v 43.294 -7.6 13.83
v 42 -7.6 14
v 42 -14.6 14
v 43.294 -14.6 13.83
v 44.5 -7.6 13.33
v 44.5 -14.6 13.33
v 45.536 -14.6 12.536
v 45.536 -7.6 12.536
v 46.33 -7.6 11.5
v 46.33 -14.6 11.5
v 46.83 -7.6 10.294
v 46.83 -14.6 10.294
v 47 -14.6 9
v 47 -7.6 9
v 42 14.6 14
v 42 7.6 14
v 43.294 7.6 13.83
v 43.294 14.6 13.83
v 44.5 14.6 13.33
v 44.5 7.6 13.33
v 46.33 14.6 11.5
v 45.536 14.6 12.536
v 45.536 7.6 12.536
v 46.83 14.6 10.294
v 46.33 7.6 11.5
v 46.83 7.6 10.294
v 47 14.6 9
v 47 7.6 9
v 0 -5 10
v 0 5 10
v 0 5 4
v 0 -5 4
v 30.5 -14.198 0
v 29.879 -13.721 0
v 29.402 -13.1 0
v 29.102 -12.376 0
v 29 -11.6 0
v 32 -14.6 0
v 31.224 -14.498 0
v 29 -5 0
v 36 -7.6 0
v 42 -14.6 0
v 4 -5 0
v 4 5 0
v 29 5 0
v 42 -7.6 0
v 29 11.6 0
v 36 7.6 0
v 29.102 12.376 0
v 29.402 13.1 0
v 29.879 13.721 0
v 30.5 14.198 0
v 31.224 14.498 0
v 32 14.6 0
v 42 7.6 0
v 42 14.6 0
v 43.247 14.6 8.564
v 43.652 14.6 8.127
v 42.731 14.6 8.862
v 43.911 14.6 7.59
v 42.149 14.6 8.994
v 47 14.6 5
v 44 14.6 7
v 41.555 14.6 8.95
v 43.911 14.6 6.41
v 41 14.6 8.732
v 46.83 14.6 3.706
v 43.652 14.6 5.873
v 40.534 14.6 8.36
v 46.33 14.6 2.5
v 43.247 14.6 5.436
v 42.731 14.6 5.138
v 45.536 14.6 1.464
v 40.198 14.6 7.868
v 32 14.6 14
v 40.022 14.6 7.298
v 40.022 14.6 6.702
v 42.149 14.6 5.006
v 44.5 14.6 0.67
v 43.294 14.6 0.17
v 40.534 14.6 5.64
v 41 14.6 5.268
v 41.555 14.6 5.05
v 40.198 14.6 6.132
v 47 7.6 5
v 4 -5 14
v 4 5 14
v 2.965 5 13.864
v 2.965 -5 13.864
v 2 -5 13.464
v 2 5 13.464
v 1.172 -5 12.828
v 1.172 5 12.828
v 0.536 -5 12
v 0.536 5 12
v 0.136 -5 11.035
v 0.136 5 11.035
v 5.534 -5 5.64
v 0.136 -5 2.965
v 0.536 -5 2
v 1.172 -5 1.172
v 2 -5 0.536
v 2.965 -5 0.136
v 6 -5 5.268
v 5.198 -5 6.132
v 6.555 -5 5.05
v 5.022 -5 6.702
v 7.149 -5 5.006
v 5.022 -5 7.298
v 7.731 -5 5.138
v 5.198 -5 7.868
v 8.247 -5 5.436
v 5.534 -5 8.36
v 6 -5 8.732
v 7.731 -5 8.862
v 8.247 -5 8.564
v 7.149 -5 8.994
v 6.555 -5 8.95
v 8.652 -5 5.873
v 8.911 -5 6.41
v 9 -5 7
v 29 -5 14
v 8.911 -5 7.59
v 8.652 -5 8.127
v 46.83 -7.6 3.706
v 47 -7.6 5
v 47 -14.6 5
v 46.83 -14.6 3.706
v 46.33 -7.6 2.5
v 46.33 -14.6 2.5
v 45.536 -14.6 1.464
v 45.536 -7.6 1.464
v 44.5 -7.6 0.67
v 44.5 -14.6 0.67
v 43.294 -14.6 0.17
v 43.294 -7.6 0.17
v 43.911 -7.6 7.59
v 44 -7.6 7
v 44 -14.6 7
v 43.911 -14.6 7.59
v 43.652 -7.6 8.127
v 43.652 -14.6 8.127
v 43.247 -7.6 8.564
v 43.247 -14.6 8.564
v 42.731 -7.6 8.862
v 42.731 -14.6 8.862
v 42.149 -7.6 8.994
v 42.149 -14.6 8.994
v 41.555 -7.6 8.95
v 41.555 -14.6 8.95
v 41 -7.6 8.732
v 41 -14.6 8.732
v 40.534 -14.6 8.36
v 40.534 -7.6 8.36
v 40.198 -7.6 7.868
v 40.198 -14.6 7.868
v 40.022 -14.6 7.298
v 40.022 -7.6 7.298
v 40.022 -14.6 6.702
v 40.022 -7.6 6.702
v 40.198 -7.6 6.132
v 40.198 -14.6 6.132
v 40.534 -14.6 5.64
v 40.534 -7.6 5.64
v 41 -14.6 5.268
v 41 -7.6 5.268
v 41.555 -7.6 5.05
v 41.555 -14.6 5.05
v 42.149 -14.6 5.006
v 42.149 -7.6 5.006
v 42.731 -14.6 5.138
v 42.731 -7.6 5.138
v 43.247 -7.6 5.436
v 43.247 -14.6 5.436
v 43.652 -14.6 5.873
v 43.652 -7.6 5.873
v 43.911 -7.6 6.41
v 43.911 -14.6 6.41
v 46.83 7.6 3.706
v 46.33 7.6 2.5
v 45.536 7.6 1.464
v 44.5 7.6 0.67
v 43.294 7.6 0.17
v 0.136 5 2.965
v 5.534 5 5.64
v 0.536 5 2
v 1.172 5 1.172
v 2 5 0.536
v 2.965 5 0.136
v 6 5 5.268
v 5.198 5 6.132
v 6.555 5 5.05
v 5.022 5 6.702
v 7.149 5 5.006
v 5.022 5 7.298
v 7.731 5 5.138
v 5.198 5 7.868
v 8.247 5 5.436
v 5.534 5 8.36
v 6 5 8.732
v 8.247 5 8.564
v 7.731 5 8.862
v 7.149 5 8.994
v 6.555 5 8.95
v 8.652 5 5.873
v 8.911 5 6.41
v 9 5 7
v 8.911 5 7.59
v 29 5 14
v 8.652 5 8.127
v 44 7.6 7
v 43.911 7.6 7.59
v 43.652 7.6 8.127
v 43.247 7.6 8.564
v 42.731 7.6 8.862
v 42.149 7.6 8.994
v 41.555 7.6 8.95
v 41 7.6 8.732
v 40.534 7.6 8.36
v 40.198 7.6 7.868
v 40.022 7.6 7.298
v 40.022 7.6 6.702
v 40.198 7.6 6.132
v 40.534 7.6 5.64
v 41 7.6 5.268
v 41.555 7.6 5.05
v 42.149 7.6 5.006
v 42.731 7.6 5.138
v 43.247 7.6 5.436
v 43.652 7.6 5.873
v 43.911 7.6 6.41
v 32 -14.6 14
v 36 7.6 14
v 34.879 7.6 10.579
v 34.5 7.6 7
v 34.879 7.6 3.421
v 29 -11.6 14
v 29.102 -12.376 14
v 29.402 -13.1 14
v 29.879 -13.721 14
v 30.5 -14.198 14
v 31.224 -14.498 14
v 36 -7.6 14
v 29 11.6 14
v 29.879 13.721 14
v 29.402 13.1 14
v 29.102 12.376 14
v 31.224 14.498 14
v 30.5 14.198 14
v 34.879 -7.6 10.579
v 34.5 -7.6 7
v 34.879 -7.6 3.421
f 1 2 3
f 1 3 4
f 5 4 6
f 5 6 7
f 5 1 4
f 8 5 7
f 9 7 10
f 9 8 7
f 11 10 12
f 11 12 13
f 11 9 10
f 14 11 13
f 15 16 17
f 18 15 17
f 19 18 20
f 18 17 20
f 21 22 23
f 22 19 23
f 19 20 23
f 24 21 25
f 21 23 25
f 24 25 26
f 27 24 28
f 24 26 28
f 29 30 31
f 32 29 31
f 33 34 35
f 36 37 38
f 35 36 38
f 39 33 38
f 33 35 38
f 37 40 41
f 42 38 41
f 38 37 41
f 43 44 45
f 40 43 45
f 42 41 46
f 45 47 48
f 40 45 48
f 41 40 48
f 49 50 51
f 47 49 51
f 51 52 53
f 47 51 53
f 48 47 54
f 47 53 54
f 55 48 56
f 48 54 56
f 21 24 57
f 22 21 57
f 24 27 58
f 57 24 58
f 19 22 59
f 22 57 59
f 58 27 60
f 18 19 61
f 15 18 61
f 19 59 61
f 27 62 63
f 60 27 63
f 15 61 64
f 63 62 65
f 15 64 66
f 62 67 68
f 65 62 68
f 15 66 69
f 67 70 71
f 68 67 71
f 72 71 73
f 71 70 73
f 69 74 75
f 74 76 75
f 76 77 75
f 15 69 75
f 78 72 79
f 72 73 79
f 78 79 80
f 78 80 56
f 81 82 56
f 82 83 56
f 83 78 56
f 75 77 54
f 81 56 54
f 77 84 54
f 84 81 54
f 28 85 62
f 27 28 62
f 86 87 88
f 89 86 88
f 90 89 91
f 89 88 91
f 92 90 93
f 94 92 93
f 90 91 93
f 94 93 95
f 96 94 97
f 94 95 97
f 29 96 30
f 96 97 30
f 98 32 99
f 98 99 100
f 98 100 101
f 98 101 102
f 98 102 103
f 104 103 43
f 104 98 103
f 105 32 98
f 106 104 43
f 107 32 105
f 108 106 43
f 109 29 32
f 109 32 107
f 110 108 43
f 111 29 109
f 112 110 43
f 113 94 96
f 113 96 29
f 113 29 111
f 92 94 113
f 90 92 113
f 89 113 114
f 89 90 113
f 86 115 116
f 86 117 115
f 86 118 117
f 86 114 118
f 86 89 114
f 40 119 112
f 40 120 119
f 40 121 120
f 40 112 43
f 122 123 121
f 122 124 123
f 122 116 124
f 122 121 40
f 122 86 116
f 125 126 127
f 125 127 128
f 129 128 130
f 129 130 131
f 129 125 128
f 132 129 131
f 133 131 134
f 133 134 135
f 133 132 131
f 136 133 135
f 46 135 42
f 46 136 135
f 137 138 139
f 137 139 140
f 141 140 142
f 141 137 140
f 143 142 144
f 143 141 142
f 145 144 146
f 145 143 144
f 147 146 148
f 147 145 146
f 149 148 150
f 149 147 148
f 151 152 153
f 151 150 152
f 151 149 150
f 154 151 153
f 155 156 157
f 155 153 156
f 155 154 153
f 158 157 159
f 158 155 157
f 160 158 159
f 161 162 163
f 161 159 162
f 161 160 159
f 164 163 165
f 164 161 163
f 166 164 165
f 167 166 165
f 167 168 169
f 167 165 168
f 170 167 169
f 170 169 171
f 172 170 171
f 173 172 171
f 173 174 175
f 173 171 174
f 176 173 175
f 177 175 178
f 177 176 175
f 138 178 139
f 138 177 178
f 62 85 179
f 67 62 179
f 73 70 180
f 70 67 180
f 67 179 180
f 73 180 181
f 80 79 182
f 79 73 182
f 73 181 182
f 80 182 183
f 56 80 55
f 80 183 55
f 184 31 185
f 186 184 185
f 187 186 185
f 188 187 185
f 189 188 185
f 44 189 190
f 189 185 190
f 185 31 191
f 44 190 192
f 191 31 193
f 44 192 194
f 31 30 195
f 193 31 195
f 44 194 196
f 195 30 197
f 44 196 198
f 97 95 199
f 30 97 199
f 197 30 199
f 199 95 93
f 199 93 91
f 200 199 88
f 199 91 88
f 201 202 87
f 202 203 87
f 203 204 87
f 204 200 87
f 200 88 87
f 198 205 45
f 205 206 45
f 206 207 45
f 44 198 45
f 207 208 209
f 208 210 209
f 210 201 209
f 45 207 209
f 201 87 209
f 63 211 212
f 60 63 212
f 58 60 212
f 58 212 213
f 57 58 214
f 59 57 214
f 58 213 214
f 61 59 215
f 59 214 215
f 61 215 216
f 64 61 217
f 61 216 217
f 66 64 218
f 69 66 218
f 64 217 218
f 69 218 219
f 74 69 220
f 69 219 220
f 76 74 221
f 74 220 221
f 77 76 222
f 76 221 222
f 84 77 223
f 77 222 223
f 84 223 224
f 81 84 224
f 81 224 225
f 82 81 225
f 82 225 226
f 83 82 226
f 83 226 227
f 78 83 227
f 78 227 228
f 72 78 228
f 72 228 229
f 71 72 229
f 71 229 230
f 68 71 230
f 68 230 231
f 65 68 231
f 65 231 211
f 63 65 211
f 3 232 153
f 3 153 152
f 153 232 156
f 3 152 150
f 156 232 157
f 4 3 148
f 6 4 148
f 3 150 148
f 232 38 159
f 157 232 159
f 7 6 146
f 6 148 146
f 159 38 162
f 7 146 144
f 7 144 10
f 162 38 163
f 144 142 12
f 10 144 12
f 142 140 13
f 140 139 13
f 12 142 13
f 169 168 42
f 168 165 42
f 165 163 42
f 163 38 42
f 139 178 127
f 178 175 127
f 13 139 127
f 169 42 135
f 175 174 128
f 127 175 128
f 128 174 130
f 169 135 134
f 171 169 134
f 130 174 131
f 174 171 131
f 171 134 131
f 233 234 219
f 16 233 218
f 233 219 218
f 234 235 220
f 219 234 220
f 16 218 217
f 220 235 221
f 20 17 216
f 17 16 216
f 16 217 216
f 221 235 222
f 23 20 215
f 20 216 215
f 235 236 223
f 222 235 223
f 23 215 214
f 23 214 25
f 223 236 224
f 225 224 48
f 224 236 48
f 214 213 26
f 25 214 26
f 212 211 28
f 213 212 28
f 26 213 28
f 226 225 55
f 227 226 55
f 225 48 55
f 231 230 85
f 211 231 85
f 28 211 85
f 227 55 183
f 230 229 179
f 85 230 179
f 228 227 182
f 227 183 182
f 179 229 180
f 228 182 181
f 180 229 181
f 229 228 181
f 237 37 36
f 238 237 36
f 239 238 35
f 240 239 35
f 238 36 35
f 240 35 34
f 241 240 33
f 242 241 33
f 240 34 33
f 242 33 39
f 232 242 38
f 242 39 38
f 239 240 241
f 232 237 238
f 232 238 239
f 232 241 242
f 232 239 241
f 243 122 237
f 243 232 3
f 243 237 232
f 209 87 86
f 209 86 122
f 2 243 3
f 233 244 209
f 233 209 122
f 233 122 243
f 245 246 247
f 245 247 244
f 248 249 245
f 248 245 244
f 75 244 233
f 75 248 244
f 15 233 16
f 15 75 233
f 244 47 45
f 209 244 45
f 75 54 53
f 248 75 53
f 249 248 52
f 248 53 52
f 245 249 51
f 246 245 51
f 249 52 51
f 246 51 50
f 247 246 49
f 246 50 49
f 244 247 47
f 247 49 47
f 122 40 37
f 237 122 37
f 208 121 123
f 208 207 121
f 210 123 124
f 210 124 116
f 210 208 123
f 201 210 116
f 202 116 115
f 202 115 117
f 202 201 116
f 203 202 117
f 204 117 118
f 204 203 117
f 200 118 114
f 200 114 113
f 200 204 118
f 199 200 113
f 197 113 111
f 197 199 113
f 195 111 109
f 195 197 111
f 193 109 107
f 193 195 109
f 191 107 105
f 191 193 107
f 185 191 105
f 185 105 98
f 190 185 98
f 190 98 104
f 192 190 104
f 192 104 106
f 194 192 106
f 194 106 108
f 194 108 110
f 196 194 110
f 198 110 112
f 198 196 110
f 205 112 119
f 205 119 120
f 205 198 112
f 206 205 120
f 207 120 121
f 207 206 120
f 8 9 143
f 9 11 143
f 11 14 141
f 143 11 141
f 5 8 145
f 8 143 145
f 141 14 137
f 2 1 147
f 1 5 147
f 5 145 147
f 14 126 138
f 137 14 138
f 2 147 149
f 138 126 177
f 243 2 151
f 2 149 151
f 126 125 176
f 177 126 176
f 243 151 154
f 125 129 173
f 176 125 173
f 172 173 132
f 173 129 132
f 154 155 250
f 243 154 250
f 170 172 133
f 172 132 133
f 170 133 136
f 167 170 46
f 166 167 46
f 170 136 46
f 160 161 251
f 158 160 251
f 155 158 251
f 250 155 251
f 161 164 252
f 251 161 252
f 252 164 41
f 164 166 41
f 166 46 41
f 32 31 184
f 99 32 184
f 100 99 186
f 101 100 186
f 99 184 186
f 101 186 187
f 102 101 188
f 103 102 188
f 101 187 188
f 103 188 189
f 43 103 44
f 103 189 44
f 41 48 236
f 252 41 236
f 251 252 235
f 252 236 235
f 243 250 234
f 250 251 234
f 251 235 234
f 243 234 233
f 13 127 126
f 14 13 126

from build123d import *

# Parameters (mm, degrees)
F0_R          = 2
F2_DEPTH      = 5
F2_DEPTH_BACK = 5
F3_DEPTH      = 14
F4_DEPTH      = 25
F4_DEPTH_BACK = 25
F5_DEPTH      = 7.6
F5_DEPTH_BACK = 7.6


with BuildPart() as f2:
    # F0 (on Front) → F2 (new body, two sides)
    with BuildSketch(Plane.XZ) as f2_sk:
        with BuildLine():
            ThreePointArc((0, 4), (1.1715728753, 1.1715728753), (4, 0))
            Line((4, 0), (29, 0))
            Line((29, 0), (29, 14))
            Line((29, 14), (4, 14))
            ThreePointArc((4, 14), (1.1715728753, 12.8284271247), (0, 10))
            Line((0, 10), (0, 4))
        make_face()
        with Locations((7, 7)):
            Circle(F0_R, mode=Mode.SUBTRACT)
        with BuildLine():
            Line((29, 14), (29, 0))
            Line((29, 0), (36, 0))
            ThreePointArc((36, 0), (34.5, 7), (36, 14))
            Line((36, 14), (29, 14))
        make_face()
    extrude(amount=-F2_DEPTH)
    extrude(f2_sk.sketch, amount=F2_DEPTH_BACK)

    # F1 (on Top) → F3 (join)
    with BuildSketch(Plane.XY):
        with BuildLine():
            Line((36, 7.6), (47, 7.6))
            Line((47, 7.6), (47, 14.6))
            Line((47, 14.6), (32, 14.6))
            ThreePointArc((32, 14.6), (29.8786796564, 13.7213203436), (29, 11.6))
            Line((29, 11.6), (29, 5))
            Line((29, 5), (36, 5))
            Line((36, 5), (36, 7.6))
        make_face()
        with BuildLine():
            ThreePointArc((29, -11.6), (29.8786796564, -13.7213203436), (32, -14.6))
            Line((32, -14.6), (47, -14.6))
            Line((47, -14.6), (47, -7.6))
            Line((47, -7.6), (36, -7.6))
            Line((36, -7.6), (36, -5))
            Line((36, -5), (29, -5))
            Line((29, -5), (29, -11.6))
        make_face()
    extrude(amount=F3_DEPTH)

    # F0 (on Front) → F4 (cut, two sides)
    with BuildSketch(Plane.XZ) as f4_sk:
        with Locations((42, 7)):
            Circle(F0_R)
        with BuildLine():
            Line((47, 14), (42, 14))
            ThreePointArc((42, 14), (45.5355339059, 12.5355339059), (47, 9))
            Line((47, 9), (47, 14))
        make_face()
        with BuildLine():
            ThreePointArc((47, 5), (45.5355339059, 1.4644660941), (42, 0))
            Line((42, 0), (47, 0))
            Line((47, 0), (47, 5))
        make_face()
    extrude(amount=-F4_DEPTH, mode=Mode.SUBTRACT)
    extrude(f4_sk.sketch, amount=F4_DEPTH_BACK, mode=Mode.SUBTRACT)

    # F0 (on Front) → F5 (cut, two sides)
    with BuildSketch(Plane.XZ) as f5_sk:
        with BuildLine():
            ThreePointArc((36, 14), (34.5, 7), (36, 0))
            Line((36, 0), (36, 14))
        make_face()
    extrude(amount=-F5_DEPTH, mode=Mode.SUBTRACT)
    extrude(f5_sk.sketch, amount=F5_DEPTH_BACK, mode=Mode.SUBTRACT)


solid = f2.part
